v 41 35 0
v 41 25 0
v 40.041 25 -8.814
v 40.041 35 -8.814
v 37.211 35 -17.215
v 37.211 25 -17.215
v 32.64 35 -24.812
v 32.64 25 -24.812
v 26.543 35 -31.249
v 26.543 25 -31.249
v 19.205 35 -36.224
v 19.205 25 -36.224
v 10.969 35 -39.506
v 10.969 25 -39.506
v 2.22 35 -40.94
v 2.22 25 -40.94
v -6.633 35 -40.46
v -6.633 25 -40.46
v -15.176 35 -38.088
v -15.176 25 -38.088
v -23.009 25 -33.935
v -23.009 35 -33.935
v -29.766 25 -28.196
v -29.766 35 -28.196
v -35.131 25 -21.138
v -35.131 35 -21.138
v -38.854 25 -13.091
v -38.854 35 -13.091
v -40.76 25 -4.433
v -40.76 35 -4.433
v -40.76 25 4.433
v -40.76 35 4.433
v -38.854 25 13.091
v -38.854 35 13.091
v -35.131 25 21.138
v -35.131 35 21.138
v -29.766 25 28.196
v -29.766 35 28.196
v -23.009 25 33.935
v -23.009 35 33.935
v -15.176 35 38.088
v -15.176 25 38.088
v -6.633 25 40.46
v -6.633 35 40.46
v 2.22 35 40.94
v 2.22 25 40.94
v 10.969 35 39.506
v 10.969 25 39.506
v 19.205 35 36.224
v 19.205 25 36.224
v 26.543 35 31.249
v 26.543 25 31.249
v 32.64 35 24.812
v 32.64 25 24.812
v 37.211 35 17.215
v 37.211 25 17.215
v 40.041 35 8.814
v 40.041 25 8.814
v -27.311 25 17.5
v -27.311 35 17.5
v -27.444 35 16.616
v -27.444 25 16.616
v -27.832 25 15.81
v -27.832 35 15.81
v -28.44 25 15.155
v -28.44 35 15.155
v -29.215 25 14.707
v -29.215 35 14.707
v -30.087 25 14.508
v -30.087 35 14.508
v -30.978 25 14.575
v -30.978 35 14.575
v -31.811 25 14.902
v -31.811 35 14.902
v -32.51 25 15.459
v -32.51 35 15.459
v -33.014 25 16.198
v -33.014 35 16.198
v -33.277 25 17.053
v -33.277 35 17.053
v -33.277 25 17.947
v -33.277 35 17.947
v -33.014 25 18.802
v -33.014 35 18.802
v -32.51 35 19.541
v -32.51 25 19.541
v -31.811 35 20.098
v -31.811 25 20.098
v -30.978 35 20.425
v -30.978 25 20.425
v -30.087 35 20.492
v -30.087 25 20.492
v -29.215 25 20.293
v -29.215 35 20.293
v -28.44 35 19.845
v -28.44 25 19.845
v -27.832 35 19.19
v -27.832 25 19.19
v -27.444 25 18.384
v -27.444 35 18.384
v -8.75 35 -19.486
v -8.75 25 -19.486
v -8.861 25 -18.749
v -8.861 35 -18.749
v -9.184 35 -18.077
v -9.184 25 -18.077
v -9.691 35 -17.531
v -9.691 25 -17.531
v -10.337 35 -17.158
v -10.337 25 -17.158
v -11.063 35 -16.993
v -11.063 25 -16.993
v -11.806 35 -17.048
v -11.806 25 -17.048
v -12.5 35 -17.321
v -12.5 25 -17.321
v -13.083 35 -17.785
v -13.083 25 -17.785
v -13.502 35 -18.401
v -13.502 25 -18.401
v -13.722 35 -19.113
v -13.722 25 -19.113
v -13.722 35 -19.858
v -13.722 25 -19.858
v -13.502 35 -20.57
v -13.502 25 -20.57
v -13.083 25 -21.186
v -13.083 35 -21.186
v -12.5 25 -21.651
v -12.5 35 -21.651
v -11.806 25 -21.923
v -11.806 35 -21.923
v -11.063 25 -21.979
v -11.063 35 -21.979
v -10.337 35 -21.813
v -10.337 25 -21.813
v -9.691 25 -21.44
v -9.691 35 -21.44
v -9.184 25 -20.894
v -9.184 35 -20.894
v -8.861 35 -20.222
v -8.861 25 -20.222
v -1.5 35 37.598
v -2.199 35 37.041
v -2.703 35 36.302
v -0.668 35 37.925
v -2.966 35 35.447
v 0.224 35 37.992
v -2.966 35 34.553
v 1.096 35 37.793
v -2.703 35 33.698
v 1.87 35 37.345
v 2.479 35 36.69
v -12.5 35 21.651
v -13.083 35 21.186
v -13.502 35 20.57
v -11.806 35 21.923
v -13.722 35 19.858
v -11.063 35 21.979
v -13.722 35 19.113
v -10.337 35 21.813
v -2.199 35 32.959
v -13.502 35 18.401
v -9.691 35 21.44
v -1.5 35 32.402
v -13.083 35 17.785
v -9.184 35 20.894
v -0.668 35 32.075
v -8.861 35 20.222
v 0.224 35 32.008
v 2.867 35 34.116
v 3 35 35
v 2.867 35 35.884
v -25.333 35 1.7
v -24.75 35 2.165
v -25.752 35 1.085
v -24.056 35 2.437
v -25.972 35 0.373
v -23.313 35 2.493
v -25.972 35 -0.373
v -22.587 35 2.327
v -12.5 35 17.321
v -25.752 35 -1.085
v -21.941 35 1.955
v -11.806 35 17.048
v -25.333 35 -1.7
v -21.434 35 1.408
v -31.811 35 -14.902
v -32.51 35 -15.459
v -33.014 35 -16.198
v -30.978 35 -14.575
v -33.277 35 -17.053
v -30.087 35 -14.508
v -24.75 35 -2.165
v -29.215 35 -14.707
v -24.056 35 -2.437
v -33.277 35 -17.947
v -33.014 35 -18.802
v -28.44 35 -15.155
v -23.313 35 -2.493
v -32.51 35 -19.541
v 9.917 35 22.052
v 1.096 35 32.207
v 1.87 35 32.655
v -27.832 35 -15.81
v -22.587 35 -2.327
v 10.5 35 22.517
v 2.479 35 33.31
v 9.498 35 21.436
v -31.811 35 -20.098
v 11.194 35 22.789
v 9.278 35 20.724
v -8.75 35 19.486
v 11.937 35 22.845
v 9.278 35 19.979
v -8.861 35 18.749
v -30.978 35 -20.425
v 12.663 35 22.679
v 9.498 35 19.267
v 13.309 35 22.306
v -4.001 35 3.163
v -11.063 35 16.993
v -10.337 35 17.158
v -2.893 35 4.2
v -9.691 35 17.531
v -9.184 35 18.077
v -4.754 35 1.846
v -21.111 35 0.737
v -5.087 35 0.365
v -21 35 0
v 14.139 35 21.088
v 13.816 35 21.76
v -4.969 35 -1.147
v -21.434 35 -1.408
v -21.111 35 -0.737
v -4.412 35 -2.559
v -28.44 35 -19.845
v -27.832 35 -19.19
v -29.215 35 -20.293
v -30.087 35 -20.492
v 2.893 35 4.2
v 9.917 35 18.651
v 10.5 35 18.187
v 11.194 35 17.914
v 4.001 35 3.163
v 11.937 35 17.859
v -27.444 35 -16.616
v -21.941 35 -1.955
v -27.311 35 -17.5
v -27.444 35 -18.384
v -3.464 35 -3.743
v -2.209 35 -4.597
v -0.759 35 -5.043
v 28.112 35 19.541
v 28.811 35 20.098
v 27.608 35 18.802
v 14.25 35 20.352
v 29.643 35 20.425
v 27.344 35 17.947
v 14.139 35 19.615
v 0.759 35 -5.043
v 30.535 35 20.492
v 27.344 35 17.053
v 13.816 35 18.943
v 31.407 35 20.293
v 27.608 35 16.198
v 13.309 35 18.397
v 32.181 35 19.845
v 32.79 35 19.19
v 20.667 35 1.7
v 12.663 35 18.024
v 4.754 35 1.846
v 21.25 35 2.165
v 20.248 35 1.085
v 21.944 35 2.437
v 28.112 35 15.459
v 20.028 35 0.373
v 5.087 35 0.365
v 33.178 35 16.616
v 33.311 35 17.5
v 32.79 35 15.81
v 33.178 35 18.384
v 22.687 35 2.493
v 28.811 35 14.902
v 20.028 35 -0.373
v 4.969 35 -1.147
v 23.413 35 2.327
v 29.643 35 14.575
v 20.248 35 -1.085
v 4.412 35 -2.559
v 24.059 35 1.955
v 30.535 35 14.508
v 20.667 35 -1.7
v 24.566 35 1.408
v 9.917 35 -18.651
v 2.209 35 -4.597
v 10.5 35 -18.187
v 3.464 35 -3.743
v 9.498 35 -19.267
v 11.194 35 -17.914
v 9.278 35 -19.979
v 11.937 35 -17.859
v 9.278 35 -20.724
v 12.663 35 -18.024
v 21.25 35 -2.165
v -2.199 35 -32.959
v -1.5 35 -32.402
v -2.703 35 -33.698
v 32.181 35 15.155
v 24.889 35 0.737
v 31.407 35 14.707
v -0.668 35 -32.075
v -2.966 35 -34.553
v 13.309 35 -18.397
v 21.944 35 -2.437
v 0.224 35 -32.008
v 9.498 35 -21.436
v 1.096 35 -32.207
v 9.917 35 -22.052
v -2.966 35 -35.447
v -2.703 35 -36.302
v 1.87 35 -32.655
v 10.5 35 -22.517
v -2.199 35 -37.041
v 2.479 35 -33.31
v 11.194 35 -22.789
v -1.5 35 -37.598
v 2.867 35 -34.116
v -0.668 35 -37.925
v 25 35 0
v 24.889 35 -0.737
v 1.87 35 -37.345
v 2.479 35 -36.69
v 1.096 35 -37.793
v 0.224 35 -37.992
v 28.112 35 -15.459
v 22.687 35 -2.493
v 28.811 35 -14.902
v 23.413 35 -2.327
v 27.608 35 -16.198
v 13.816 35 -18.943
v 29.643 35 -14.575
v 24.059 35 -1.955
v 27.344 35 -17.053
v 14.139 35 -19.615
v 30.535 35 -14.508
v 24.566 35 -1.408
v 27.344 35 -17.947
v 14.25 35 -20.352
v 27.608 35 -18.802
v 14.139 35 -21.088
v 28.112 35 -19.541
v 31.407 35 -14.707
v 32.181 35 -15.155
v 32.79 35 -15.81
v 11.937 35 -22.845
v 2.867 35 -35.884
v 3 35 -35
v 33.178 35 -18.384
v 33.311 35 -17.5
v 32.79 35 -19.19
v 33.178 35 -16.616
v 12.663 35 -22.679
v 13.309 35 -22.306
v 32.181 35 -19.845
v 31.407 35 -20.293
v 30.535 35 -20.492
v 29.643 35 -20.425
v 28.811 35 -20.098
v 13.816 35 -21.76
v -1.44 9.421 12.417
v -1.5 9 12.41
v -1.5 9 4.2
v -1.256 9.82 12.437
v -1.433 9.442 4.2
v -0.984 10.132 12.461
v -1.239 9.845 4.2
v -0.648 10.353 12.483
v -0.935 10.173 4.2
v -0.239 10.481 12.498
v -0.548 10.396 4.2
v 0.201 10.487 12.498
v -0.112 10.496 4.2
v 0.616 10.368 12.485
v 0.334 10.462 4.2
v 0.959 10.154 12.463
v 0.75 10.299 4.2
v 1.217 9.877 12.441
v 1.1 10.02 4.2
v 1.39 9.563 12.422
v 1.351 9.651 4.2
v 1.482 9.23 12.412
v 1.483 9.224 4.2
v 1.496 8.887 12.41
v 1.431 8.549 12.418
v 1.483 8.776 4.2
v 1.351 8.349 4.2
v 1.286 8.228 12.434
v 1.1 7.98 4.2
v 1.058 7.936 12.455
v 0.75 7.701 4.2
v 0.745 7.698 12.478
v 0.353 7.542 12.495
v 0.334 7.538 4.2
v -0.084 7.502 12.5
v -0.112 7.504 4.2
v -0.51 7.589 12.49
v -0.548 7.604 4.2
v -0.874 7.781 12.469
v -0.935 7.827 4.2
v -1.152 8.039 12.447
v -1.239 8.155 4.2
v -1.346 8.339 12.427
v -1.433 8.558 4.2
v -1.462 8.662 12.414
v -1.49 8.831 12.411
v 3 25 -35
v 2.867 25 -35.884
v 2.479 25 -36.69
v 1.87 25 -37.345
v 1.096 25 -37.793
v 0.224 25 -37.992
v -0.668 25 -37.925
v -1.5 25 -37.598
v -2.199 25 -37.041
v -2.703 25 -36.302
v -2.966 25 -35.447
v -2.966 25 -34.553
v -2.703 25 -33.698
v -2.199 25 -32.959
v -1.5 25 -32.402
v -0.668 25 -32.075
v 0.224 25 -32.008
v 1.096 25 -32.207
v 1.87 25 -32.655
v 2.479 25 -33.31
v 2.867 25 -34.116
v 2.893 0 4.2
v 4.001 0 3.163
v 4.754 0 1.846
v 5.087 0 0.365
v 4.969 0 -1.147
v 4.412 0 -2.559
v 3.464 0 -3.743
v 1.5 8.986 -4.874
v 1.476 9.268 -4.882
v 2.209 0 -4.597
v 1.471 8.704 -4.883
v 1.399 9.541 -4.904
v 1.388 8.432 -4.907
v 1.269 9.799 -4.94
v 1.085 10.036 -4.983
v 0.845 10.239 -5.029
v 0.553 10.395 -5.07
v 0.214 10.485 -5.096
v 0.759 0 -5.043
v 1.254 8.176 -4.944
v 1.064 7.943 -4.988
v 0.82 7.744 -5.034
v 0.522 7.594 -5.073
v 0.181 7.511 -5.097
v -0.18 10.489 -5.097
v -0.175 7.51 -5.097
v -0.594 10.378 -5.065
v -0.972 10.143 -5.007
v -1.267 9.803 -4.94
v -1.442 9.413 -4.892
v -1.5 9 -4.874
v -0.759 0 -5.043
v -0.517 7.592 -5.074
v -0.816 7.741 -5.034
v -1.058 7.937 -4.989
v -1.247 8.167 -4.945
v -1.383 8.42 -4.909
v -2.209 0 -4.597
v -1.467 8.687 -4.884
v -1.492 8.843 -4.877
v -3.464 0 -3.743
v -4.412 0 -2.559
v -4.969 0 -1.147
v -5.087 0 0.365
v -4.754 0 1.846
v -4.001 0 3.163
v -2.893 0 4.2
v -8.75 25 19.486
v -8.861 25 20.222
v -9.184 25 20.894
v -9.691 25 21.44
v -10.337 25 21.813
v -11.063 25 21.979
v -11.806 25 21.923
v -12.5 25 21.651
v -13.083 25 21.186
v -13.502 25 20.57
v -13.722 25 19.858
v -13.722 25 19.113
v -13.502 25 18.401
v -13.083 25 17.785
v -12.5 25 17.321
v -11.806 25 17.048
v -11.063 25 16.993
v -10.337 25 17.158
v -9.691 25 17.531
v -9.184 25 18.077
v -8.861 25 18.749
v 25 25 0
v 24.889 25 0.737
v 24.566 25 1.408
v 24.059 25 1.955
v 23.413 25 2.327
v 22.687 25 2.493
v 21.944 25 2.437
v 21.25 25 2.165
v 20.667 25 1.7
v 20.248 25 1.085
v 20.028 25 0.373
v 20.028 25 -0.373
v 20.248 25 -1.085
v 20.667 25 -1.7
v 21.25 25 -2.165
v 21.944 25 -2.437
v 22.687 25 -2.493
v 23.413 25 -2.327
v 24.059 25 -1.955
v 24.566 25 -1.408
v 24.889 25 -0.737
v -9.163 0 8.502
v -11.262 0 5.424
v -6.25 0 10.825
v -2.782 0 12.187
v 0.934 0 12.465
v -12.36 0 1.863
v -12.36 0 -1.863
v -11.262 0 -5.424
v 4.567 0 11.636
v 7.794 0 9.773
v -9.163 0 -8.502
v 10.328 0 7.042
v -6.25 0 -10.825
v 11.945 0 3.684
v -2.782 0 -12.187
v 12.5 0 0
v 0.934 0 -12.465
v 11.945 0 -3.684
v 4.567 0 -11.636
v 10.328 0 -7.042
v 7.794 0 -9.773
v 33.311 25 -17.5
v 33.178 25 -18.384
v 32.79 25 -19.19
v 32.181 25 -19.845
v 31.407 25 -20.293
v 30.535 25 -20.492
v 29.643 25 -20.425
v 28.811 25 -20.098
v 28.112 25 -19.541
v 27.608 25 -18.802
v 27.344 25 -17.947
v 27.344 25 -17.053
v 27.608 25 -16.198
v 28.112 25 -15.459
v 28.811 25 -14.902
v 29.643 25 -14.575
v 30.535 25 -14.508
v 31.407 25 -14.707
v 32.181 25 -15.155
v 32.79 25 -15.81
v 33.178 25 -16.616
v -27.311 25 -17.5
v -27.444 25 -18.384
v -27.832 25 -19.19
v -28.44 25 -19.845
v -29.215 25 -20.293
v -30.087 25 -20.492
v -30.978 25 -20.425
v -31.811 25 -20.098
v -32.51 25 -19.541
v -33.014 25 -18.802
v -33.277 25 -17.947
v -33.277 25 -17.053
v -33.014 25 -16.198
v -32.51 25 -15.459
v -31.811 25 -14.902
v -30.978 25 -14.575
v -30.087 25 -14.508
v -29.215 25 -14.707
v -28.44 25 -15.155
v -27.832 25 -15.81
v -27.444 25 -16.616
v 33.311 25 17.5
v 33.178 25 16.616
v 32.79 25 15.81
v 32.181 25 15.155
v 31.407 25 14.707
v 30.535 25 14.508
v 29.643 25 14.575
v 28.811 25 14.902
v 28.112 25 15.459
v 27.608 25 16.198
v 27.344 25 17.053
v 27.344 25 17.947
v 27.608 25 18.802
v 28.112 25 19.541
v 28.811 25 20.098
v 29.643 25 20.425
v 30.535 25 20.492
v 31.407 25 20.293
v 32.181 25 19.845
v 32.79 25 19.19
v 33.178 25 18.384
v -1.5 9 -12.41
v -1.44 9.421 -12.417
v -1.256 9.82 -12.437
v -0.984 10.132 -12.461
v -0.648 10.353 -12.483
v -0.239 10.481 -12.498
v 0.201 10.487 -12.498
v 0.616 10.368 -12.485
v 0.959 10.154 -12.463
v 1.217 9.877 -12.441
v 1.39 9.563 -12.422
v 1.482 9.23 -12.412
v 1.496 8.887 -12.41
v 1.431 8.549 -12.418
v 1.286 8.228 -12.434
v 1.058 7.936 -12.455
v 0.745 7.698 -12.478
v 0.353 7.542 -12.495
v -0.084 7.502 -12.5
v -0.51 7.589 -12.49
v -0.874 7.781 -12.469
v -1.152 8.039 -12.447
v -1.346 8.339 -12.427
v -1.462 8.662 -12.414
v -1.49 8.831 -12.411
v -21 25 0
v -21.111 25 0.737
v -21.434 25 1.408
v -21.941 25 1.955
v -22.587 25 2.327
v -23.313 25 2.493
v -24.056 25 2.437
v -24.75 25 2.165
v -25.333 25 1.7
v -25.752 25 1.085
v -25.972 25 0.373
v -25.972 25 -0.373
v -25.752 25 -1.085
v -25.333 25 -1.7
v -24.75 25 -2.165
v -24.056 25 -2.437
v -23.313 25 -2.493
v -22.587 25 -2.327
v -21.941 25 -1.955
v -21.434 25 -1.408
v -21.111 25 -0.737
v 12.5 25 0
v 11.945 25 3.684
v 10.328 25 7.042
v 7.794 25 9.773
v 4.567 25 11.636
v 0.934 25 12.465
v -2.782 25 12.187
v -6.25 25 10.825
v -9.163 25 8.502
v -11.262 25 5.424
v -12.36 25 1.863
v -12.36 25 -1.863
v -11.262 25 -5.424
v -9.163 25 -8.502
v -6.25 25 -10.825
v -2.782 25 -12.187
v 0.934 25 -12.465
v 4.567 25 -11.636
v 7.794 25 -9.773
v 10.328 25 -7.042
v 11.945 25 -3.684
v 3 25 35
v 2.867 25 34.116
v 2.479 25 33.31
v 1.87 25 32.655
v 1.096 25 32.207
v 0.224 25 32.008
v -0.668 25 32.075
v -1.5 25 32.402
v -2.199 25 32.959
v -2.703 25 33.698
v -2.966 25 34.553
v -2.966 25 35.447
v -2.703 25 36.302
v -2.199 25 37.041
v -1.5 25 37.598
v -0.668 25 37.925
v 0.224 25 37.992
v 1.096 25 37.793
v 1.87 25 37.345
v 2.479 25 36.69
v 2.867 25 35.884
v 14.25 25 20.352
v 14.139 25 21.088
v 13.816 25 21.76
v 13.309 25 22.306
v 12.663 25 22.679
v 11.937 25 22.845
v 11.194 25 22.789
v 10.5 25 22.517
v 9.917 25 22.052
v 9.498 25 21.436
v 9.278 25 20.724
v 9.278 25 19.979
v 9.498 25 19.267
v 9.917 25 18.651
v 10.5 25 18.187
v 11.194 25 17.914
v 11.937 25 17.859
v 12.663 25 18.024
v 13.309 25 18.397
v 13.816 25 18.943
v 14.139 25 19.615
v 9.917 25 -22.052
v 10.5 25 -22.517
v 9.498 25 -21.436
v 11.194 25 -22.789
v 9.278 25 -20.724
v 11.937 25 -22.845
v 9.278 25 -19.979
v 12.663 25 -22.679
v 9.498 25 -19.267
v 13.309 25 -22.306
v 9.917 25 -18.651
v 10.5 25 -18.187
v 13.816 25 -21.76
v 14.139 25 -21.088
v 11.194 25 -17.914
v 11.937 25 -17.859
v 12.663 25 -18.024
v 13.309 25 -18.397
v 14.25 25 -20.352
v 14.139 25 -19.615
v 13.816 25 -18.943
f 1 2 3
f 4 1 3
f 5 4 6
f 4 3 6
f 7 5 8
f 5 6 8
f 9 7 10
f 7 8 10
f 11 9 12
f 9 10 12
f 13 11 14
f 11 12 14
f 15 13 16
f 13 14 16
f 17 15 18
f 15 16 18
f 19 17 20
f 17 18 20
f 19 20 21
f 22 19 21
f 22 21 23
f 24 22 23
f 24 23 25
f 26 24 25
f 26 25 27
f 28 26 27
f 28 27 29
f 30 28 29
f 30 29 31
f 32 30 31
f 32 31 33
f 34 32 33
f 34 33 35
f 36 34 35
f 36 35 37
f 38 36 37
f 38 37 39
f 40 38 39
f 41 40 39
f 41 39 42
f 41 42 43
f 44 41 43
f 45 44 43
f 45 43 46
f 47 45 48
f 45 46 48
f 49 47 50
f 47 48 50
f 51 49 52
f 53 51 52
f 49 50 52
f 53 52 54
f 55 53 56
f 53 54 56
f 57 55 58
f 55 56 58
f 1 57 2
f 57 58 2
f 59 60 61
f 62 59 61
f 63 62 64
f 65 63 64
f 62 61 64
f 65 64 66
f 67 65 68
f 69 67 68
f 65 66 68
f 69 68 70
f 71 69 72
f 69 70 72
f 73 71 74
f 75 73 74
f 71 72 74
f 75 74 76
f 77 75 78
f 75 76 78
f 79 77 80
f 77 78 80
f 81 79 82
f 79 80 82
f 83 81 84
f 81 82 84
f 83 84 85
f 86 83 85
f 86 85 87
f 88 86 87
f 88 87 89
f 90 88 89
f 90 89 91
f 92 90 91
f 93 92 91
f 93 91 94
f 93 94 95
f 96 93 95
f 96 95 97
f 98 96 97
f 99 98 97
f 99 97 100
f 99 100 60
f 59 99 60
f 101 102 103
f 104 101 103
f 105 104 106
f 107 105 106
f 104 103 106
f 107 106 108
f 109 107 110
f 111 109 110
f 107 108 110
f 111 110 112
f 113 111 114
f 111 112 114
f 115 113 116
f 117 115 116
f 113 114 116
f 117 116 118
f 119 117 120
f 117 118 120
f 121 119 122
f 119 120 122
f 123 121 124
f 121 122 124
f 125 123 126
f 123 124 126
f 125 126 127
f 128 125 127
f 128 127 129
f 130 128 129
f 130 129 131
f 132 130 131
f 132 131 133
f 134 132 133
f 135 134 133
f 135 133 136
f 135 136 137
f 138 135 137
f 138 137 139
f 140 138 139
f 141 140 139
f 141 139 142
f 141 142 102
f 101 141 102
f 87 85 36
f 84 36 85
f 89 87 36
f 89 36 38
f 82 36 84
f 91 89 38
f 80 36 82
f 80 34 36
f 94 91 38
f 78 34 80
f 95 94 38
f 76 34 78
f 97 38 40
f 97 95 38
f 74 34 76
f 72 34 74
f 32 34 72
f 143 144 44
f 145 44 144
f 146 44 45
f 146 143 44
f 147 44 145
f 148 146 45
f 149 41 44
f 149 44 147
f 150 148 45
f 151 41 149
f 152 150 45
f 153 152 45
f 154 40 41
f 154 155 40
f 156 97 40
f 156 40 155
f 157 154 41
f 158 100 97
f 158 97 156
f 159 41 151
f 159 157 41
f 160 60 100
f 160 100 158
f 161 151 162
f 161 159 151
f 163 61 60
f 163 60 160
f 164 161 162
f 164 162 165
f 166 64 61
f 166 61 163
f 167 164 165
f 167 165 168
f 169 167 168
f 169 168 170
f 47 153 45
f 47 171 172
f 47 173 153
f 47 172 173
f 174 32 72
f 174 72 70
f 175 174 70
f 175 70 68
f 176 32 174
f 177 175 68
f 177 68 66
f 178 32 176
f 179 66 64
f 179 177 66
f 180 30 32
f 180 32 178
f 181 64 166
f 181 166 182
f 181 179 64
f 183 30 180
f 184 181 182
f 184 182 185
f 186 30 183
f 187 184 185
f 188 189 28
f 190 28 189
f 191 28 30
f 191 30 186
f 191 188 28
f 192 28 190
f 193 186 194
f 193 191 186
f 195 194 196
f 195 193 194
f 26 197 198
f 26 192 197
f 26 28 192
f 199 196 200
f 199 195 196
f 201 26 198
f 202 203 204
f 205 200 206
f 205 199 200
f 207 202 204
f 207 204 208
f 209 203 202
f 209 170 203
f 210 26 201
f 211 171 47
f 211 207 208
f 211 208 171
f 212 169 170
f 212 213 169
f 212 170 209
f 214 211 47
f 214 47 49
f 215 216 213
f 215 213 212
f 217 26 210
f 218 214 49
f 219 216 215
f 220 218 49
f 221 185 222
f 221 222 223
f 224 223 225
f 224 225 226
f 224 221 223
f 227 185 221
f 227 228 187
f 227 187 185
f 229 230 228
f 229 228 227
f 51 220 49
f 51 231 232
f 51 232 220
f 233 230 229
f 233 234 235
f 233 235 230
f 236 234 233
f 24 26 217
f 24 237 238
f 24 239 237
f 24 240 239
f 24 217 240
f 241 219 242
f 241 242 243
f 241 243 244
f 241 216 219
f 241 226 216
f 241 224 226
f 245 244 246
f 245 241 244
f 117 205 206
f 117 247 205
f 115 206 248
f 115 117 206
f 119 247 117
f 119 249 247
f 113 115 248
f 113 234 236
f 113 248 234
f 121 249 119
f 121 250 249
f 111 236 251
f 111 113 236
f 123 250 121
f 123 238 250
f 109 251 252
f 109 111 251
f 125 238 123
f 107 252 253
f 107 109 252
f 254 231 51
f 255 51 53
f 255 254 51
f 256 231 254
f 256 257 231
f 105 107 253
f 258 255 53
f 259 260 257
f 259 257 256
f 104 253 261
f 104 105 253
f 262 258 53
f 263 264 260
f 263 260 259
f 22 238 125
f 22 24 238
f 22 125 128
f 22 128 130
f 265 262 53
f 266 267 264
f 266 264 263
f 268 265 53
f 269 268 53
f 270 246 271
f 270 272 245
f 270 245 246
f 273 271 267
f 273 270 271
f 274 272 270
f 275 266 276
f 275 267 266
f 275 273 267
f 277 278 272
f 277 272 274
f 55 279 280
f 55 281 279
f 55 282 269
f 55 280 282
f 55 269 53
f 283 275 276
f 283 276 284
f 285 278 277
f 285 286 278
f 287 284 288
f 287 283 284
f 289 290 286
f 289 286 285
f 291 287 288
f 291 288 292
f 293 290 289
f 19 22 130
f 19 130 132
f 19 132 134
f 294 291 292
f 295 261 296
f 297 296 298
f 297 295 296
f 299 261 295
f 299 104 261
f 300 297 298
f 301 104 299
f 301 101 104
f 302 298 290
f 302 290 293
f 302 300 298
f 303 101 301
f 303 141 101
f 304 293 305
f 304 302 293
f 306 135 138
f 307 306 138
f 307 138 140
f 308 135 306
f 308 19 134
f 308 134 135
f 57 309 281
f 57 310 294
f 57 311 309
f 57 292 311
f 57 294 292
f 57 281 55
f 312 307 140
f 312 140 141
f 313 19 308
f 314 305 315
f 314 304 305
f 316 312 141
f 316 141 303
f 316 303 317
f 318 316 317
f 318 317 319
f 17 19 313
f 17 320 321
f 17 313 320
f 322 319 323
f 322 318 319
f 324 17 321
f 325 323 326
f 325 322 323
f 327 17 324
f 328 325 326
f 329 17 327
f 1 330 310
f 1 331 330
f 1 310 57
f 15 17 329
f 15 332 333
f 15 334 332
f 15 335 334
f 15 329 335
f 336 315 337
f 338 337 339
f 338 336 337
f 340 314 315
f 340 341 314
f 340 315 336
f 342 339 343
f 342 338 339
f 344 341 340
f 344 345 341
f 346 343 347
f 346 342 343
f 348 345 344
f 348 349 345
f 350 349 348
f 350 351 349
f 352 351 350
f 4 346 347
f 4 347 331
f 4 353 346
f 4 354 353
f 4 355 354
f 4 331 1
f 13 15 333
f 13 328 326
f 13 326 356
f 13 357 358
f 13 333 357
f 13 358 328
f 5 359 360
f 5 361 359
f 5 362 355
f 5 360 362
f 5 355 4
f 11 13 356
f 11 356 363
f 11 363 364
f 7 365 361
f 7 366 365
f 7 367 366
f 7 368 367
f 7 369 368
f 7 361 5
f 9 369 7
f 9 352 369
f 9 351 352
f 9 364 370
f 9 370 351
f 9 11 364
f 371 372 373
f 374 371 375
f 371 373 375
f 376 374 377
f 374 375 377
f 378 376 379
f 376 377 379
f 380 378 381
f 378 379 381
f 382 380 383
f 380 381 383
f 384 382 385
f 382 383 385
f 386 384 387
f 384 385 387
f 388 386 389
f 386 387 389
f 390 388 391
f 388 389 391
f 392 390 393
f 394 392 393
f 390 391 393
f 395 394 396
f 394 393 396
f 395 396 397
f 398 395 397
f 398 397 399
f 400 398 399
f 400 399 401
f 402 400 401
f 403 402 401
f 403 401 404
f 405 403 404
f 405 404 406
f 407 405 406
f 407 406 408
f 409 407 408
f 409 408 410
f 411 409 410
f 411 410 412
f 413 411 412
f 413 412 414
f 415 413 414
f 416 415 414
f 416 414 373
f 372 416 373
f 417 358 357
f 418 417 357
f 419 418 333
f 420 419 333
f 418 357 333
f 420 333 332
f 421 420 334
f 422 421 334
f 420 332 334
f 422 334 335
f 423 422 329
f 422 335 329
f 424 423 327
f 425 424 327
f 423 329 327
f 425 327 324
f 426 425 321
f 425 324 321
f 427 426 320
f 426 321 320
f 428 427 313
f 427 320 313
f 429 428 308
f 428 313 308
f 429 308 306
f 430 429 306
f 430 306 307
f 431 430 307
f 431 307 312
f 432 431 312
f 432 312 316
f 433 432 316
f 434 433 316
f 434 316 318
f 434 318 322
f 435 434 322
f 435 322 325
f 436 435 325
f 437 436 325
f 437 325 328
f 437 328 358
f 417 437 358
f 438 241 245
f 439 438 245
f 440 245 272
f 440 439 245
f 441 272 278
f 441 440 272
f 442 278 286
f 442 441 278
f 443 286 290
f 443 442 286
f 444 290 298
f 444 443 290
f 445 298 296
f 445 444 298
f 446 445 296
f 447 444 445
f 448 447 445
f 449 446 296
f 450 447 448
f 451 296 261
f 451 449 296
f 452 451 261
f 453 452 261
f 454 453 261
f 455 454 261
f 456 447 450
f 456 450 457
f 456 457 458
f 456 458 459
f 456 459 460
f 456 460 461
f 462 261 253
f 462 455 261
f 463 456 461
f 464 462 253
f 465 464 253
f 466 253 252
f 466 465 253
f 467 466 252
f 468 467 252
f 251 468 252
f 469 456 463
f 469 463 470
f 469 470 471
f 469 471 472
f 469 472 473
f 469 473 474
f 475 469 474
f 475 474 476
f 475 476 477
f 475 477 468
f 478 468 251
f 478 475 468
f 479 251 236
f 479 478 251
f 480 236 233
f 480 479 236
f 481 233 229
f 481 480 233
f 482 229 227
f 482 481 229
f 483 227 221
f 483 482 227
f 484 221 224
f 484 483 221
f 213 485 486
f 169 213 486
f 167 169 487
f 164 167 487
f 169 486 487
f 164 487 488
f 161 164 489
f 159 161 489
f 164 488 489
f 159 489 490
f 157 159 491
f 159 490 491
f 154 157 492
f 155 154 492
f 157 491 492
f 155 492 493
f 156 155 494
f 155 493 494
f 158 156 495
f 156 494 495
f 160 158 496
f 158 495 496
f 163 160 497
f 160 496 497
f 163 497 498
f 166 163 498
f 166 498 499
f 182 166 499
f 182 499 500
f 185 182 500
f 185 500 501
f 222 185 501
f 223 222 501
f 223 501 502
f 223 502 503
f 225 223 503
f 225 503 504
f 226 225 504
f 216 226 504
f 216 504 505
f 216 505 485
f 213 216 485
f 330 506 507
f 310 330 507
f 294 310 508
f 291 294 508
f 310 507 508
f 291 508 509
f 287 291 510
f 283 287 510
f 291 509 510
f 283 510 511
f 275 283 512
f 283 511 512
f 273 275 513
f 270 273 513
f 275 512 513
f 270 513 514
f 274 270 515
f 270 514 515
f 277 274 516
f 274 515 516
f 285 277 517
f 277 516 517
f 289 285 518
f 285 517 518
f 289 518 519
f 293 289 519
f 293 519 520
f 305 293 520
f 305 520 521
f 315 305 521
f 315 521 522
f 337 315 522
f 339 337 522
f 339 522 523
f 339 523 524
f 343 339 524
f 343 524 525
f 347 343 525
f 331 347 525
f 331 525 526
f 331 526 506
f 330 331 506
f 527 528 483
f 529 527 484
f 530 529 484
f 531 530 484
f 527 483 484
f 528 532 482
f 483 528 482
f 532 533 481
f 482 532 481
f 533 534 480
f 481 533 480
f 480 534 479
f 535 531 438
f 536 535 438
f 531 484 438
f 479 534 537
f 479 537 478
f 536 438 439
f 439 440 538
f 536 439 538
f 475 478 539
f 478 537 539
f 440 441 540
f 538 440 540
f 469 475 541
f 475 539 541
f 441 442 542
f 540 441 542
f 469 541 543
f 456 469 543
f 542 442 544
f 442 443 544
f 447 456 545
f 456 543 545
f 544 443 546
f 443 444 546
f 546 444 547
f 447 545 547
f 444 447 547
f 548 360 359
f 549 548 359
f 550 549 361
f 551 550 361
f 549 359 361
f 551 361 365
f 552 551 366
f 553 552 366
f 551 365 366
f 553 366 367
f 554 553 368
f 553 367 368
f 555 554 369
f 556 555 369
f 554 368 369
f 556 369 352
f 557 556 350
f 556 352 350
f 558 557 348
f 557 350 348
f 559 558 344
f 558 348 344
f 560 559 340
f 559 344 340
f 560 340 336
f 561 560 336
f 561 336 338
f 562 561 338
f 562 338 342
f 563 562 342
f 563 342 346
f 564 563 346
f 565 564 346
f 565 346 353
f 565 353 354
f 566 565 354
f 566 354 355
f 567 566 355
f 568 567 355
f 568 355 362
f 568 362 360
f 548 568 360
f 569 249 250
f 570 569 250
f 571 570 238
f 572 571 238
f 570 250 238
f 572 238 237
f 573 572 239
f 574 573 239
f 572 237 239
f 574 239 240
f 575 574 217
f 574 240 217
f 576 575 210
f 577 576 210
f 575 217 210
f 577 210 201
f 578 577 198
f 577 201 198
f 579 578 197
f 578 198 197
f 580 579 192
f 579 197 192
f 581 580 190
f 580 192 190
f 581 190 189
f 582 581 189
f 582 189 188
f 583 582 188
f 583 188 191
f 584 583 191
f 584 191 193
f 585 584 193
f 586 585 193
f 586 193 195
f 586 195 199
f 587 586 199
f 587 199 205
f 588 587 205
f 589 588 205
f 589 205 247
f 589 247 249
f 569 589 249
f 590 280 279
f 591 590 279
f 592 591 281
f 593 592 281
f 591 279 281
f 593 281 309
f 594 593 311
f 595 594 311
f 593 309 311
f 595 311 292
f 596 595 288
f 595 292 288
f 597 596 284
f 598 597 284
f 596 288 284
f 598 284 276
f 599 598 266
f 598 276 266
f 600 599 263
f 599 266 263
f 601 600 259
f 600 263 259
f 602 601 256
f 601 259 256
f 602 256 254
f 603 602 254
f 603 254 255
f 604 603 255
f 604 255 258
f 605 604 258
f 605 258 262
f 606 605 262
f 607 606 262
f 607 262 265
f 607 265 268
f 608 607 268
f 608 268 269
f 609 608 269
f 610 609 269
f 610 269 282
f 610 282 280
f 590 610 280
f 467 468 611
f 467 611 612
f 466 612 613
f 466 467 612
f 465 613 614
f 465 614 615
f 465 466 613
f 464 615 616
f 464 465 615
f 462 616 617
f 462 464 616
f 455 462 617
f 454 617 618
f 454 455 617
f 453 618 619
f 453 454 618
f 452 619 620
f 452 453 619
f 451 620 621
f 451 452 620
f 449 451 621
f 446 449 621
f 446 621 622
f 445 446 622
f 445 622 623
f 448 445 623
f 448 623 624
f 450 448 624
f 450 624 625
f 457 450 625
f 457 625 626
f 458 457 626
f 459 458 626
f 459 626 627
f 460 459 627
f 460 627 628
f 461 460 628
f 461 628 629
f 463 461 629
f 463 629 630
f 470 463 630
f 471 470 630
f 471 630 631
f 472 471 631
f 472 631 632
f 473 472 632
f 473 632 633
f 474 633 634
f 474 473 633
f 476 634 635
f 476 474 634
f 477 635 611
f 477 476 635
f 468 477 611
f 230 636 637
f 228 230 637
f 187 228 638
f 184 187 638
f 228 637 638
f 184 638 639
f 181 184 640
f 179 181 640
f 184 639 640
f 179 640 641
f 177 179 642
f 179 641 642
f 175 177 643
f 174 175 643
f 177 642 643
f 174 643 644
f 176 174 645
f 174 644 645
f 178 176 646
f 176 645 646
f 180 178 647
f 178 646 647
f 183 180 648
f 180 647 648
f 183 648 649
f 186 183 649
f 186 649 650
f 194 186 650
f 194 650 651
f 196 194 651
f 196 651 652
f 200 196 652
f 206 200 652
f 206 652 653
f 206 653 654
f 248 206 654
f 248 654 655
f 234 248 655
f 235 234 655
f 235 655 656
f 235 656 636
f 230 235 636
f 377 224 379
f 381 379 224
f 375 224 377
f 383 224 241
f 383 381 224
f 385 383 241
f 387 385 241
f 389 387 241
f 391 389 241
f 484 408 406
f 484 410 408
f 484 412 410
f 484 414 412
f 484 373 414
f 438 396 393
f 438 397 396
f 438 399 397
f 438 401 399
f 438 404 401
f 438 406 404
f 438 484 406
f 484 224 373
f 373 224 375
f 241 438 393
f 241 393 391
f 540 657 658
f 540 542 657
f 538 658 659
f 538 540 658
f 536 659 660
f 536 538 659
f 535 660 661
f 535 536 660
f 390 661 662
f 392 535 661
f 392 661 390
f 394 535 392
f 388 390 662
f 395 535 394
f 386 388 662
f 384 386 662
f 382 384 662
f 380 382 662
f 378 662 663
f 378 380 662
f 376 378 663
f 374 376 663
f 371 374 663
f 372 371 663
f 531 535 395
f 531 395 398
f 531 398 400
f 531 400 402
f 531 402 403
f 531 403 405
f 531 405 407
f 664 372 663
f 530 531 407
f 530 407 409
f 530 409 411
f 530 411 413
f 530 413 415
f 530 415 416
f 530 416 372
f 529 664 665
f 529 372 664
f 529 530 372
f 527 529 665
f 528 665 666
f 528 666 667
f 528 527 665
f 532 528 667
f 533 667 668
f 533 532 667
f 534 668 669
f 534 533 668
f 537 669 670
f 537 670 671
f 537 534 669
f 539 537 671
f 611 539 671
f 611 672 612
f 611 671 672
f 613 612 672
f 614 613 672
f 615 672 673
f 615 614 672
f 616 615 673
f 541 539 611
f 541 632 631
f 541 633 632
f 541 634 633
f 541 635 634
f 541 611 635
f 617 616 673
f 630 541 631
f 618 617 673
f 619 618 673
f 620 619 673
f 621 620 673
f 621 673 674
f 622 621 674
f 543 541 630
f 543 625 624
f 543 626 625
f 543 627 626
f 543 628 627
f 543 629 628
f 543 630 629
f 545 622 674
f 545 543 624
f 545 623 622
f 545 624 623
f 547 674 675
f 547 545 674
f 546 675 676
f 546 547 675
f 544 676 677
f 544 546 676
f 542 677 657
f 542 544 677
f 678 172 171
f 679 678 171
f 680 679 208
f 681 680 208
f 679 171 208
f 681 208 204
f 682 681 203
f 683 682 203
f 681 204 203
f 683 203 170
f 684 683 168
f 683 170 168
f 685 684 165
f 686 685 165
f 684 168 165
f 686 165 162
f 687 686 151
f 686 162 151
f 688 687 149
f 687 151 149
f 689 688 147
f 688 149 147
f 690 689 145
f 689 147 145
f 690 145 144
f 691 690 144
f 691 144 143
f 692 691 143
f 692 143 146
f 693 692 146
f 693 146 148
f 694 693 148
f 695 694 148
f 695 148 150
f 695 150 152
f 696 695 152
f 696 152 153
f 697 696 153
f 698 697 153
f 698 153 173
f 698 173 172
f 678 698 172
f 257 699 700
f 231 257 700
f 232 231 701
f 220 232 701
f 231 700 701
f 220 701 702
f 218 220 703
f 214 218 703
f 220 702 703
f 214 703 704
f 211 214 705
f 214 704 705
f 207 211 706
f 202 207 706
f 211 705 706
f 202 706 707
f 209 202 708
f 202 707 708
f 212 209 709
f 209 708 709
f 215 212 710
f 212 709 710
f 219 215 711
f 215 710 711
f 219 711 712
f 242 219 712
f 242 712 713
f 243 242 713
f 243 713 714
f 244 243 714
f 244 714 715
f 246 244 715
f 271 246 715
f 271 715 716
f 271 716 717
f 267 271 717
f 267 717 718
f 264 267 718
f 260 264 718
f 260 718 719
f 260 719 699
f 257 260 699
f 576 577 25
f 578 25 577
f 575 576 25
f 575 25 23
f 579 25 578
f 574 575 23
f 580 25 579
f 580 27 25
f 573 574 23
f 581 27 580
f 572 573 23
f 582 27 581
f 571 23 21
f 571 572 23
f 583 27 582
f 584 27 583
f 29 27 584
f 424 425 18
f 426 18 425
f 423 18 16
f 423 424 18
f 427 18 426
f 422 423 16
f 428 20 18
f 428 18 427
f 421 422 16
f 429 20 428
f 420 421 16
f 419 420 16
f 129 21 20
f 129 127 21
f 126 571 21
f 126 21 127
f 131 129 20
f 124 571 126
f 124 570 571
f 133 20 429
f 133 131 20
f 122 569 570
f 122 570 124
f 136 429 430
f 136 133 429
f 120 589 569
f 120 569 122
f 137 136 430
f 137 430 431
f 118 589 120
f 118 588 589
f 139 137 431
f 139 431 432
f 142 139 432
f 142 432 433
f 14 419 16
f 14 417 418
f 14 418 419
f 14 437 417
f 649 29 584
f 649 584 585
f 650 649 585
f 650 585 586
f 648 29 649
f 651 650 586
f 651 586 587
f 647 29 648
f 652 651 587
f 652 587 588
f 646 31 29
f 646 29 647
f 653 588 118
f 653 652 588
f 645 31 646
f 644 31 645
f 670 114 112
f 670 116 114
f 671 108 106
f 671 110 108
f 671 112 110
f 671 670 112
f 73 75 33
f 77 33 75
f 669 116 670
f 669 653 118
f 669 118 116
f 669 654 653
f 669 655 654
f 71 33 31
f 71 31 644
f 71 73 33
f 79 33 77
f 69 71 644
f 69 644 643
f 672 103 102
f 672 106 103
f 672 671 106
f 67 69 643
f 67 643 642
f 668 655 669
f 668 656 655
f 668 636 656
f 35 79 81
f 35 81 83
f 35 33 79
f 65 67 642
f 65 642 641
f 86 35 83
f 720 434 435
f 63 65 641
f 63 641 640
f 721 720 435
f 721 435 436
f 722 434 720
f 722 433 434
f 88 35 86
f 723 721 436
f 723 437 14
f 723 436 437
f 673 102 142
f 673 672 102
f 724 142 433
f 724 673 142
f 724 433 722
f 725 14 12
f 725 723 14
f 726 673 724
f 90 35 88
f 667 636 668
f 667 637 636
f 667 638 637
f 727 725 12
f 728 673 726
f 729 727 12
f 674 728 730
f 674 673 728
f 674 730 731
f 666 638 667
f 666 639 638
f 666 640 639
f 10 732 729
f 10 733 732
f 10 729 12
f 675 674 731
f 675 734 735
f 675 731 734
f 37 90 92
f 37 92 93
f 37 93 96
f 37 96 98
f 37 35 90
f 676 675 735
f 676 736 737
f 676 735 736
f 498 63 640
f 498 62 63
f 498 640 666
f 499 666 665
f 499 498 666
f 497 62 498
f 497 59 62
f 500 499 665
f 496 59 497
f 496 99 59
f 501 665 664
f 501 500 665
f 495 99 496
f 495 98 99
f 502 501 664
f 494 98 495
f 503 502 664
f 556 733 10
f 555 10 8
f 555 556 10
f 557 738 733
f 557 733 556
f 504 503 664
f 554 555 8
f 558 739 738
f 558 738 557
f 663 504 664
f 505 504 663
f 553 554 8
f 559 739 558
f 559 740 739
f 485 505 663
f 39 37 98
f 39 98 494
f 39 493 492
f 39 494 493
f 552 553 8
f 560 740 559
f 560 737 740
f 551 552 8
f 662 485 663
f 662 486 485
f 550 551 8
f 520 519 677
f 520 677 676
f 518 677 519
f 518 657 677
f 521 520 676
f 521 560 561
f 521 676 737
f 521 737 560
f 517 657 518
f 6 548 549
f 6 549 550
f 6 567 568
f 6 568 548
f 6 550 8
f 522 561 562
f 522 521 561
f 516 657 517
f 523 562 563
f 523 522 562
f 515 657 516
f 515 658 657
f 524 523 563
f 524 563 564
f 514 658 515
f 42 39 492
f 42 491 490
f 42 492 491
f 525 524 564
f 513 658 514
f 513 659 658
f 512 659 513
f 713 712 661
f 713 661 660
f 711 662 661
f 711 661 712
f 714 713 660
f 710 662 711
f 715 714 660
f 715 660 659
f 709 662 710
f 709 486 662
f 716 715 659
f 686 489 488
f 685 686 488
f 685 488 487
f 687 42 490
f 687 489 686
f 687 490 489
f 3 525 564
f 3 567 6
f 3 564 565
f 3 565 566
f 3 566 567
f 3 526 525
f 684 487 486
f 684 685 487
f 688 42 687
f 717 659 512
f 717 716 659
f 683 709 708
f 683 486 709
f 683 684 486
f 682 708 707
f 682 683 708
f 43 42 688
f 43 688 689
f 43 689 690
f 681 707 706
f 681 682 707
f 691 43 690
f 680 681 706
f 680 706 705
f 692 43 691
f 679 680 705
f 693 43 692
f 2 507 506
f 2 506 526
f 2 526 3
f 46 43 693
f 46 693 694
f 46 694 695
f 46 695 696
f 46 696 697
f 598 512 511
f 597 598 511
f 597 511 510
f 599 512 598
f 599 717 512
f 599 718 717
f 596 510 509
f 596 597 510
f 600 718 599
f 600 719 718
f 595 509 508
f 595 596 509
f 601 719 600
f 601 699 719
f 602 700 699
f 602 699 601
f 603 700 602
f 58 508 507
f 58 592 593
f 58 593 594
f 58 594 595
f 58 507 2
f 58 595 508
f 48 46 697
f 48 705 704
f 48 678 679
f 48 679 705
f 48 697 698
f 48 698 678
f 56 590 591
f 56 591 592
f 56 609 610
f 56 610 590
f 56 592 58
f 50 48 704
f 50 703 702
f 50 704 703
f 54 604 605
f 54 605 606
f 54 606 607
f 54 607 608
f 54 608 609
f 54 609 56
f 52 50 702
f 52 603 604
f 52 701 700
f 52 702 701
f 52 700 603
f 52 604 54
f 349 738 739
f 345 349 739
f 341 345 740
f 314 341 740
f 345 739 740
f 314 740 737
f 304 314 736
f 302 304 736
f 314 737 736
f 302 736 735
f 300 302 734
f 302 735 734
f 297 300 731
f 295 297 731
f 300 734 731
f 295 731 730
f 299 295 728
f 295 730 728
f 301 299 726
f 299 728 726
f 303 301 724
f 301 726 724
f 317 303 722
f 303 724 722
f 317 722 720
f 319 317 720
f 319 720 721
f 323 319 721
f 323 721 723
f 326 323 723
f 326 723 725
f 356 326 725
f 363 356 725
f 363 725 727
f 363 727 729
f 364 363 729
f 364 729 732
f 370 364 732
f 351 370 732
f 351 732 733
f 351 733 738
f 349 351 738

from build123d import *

# Parameters (mm, degrees)
SKETCH1_R               = 12.5
SKETCH1_R_2             = 5.1
BOSS_EXTRUDE1_DEPTH     = 15
SKETCH2_R               = 41
SKETCH2_R_2             = 5.1
BOSS_EXTRUDE2_DEPTH     = 20
SKETCH3_R               = 3
CUT_EXTRUDE1_DEPTH      = 36
BOSS_EXTRUDE3_DEPTH     = 35
SKETCH5_R               = 1.5
CUT_EXTRUDE2_DEPTH      = 46.2
CUT_EXTRUDE2_DEPTH_BACK = 37.8
SKETCH6_R               = 41
SKETCH6_R_2             = 12.5
CUT_EXTRUDE3_DEPTH      = 10
SKETCH8_R               = 2.5
CUT_EXTRUDE4_DEPTH      = 36.0000001


with BuildPart() as part:
    # Sketch1 → Boss-Extrude1 (new body)
    with BuildSketch(Plane(origin=(0, 0, 0), x_dir=(1, 0, 0), z_dir=(0, 1, 0))):
        Circle(SKETCH1_R)
        Circle(SKETCH1_R_2, mode=Mode.SUBTRACT)
    extrude(amount=BOSS_EXTRUDE1_DEPTH)

    # Sketch2 → Boss-Extrude2 (add)
    with BuildSketch(Plane(origin=(0, 15, 0), x_dir=(1, 0, 0), z_dir=(0, 1, 0))):
        Circle(SKETCH2_R)
        Circle(SKETCH2_R_2, mode=Mode.SUBTRACT)
    extrude(amount=BOSS_EXTRUDE2_DEPTH)

    # Sketch3 → Cut-Extrude1 (cut, through all)
    with BuildSketch(Plane(origin=(0, 35, 0), x_dir=(1, 0, 0), z_dir=(0, 1, 0))):
        with Locations((0, 35)):
            Circle(SKETCH3_R)
        with Locations((30.310889132, 17.5)):
            Circle(SKETCH3_R)
        with Locations((30.310889132, -17.5)):
            Circle(SKETCH3_R)
        with Locations((0, -35)):
            Circle(SKETCH3_R)
        with Locations((-30.310889132, -17.5)):
            Circle(SKETCH3_R)
        with Locations((-30.310889132, 17.5)):
            Circle(SKETCH3_R)
    extrude(amount=-CUT_EXTRUDE1_DEPTH, mode=Mode.SUBTRACT)

    # Sketch4 → Boss-Extrude3 (add)
    with BuildSketch(Plane.XZ):
        with BuildLine():
            ThreePointArc((2.893095228, 4.2), (0, 5.1), (-2.893095228, 4.2))
            Line((-2.893095228, 4.2), (2.893095228, 4.2))
        make_face()
    extrude(amount=-BOSS_EXTRUDE3_DEPTH)

    # Sketch5 → Cut-Extrude2 (cut, two sides)
    with BuildSketch(Plane(origin=(0, 0, 4.2), x_dir=(-1, 0, 0), z_dir=(0, 0, -1))) as cut_extrude2_sk:
        with Locations((0, 9)):
            Circle(SKETCH5_R)
    extrude(amount=CUT_EXTRUDE2_DEPTH, mode=Mode.SUBTRACT)
    extrude(cut_extrude2_sk.sketch, amount=-CUT_EXTRUDE2_DEPTH_BACK, mode=Mode.SUBTRACT)

    # Sketch6 → Cut-Extrude3 (cut)
    with BuildSketch(Plane.XZ.offset(-15)):
        Circle(SKETCH6_R)
        Circle(SKETCH6_R_2, mode=Mode.SUBTRACT)
    extrude(amount=-CUT_EXTRUDE3_DEPTH, mode=Mode.SUBTRACT)

    # Sketch8 → Cut-Extrude4 (cut, through all)
    with BuildSketch(Plane.XZ):
        with Locations((22.5, 0)):
            Circle(SKETCH8_R)
        with Locations((-23.5, 0)):
            Circle(SKETCH8_R)
        with Locations((-11.25, -19.485571585)):
            Circle(SKETCH8_R)
        with Locations((-11.25, 19.485571585)):
            Circle(SKETCH8_R)
        with Locations((11.75, 20.351596989)):
            Circle(SKETCH8_R)
        with Locations((11.75, -20.351596989)):
            Circle(SKETCH8_R)
    extrude(amount=-CUT_EXTRUDE4_DEPTH, mode=Mode.SUBTRACT)


solid = part.part
